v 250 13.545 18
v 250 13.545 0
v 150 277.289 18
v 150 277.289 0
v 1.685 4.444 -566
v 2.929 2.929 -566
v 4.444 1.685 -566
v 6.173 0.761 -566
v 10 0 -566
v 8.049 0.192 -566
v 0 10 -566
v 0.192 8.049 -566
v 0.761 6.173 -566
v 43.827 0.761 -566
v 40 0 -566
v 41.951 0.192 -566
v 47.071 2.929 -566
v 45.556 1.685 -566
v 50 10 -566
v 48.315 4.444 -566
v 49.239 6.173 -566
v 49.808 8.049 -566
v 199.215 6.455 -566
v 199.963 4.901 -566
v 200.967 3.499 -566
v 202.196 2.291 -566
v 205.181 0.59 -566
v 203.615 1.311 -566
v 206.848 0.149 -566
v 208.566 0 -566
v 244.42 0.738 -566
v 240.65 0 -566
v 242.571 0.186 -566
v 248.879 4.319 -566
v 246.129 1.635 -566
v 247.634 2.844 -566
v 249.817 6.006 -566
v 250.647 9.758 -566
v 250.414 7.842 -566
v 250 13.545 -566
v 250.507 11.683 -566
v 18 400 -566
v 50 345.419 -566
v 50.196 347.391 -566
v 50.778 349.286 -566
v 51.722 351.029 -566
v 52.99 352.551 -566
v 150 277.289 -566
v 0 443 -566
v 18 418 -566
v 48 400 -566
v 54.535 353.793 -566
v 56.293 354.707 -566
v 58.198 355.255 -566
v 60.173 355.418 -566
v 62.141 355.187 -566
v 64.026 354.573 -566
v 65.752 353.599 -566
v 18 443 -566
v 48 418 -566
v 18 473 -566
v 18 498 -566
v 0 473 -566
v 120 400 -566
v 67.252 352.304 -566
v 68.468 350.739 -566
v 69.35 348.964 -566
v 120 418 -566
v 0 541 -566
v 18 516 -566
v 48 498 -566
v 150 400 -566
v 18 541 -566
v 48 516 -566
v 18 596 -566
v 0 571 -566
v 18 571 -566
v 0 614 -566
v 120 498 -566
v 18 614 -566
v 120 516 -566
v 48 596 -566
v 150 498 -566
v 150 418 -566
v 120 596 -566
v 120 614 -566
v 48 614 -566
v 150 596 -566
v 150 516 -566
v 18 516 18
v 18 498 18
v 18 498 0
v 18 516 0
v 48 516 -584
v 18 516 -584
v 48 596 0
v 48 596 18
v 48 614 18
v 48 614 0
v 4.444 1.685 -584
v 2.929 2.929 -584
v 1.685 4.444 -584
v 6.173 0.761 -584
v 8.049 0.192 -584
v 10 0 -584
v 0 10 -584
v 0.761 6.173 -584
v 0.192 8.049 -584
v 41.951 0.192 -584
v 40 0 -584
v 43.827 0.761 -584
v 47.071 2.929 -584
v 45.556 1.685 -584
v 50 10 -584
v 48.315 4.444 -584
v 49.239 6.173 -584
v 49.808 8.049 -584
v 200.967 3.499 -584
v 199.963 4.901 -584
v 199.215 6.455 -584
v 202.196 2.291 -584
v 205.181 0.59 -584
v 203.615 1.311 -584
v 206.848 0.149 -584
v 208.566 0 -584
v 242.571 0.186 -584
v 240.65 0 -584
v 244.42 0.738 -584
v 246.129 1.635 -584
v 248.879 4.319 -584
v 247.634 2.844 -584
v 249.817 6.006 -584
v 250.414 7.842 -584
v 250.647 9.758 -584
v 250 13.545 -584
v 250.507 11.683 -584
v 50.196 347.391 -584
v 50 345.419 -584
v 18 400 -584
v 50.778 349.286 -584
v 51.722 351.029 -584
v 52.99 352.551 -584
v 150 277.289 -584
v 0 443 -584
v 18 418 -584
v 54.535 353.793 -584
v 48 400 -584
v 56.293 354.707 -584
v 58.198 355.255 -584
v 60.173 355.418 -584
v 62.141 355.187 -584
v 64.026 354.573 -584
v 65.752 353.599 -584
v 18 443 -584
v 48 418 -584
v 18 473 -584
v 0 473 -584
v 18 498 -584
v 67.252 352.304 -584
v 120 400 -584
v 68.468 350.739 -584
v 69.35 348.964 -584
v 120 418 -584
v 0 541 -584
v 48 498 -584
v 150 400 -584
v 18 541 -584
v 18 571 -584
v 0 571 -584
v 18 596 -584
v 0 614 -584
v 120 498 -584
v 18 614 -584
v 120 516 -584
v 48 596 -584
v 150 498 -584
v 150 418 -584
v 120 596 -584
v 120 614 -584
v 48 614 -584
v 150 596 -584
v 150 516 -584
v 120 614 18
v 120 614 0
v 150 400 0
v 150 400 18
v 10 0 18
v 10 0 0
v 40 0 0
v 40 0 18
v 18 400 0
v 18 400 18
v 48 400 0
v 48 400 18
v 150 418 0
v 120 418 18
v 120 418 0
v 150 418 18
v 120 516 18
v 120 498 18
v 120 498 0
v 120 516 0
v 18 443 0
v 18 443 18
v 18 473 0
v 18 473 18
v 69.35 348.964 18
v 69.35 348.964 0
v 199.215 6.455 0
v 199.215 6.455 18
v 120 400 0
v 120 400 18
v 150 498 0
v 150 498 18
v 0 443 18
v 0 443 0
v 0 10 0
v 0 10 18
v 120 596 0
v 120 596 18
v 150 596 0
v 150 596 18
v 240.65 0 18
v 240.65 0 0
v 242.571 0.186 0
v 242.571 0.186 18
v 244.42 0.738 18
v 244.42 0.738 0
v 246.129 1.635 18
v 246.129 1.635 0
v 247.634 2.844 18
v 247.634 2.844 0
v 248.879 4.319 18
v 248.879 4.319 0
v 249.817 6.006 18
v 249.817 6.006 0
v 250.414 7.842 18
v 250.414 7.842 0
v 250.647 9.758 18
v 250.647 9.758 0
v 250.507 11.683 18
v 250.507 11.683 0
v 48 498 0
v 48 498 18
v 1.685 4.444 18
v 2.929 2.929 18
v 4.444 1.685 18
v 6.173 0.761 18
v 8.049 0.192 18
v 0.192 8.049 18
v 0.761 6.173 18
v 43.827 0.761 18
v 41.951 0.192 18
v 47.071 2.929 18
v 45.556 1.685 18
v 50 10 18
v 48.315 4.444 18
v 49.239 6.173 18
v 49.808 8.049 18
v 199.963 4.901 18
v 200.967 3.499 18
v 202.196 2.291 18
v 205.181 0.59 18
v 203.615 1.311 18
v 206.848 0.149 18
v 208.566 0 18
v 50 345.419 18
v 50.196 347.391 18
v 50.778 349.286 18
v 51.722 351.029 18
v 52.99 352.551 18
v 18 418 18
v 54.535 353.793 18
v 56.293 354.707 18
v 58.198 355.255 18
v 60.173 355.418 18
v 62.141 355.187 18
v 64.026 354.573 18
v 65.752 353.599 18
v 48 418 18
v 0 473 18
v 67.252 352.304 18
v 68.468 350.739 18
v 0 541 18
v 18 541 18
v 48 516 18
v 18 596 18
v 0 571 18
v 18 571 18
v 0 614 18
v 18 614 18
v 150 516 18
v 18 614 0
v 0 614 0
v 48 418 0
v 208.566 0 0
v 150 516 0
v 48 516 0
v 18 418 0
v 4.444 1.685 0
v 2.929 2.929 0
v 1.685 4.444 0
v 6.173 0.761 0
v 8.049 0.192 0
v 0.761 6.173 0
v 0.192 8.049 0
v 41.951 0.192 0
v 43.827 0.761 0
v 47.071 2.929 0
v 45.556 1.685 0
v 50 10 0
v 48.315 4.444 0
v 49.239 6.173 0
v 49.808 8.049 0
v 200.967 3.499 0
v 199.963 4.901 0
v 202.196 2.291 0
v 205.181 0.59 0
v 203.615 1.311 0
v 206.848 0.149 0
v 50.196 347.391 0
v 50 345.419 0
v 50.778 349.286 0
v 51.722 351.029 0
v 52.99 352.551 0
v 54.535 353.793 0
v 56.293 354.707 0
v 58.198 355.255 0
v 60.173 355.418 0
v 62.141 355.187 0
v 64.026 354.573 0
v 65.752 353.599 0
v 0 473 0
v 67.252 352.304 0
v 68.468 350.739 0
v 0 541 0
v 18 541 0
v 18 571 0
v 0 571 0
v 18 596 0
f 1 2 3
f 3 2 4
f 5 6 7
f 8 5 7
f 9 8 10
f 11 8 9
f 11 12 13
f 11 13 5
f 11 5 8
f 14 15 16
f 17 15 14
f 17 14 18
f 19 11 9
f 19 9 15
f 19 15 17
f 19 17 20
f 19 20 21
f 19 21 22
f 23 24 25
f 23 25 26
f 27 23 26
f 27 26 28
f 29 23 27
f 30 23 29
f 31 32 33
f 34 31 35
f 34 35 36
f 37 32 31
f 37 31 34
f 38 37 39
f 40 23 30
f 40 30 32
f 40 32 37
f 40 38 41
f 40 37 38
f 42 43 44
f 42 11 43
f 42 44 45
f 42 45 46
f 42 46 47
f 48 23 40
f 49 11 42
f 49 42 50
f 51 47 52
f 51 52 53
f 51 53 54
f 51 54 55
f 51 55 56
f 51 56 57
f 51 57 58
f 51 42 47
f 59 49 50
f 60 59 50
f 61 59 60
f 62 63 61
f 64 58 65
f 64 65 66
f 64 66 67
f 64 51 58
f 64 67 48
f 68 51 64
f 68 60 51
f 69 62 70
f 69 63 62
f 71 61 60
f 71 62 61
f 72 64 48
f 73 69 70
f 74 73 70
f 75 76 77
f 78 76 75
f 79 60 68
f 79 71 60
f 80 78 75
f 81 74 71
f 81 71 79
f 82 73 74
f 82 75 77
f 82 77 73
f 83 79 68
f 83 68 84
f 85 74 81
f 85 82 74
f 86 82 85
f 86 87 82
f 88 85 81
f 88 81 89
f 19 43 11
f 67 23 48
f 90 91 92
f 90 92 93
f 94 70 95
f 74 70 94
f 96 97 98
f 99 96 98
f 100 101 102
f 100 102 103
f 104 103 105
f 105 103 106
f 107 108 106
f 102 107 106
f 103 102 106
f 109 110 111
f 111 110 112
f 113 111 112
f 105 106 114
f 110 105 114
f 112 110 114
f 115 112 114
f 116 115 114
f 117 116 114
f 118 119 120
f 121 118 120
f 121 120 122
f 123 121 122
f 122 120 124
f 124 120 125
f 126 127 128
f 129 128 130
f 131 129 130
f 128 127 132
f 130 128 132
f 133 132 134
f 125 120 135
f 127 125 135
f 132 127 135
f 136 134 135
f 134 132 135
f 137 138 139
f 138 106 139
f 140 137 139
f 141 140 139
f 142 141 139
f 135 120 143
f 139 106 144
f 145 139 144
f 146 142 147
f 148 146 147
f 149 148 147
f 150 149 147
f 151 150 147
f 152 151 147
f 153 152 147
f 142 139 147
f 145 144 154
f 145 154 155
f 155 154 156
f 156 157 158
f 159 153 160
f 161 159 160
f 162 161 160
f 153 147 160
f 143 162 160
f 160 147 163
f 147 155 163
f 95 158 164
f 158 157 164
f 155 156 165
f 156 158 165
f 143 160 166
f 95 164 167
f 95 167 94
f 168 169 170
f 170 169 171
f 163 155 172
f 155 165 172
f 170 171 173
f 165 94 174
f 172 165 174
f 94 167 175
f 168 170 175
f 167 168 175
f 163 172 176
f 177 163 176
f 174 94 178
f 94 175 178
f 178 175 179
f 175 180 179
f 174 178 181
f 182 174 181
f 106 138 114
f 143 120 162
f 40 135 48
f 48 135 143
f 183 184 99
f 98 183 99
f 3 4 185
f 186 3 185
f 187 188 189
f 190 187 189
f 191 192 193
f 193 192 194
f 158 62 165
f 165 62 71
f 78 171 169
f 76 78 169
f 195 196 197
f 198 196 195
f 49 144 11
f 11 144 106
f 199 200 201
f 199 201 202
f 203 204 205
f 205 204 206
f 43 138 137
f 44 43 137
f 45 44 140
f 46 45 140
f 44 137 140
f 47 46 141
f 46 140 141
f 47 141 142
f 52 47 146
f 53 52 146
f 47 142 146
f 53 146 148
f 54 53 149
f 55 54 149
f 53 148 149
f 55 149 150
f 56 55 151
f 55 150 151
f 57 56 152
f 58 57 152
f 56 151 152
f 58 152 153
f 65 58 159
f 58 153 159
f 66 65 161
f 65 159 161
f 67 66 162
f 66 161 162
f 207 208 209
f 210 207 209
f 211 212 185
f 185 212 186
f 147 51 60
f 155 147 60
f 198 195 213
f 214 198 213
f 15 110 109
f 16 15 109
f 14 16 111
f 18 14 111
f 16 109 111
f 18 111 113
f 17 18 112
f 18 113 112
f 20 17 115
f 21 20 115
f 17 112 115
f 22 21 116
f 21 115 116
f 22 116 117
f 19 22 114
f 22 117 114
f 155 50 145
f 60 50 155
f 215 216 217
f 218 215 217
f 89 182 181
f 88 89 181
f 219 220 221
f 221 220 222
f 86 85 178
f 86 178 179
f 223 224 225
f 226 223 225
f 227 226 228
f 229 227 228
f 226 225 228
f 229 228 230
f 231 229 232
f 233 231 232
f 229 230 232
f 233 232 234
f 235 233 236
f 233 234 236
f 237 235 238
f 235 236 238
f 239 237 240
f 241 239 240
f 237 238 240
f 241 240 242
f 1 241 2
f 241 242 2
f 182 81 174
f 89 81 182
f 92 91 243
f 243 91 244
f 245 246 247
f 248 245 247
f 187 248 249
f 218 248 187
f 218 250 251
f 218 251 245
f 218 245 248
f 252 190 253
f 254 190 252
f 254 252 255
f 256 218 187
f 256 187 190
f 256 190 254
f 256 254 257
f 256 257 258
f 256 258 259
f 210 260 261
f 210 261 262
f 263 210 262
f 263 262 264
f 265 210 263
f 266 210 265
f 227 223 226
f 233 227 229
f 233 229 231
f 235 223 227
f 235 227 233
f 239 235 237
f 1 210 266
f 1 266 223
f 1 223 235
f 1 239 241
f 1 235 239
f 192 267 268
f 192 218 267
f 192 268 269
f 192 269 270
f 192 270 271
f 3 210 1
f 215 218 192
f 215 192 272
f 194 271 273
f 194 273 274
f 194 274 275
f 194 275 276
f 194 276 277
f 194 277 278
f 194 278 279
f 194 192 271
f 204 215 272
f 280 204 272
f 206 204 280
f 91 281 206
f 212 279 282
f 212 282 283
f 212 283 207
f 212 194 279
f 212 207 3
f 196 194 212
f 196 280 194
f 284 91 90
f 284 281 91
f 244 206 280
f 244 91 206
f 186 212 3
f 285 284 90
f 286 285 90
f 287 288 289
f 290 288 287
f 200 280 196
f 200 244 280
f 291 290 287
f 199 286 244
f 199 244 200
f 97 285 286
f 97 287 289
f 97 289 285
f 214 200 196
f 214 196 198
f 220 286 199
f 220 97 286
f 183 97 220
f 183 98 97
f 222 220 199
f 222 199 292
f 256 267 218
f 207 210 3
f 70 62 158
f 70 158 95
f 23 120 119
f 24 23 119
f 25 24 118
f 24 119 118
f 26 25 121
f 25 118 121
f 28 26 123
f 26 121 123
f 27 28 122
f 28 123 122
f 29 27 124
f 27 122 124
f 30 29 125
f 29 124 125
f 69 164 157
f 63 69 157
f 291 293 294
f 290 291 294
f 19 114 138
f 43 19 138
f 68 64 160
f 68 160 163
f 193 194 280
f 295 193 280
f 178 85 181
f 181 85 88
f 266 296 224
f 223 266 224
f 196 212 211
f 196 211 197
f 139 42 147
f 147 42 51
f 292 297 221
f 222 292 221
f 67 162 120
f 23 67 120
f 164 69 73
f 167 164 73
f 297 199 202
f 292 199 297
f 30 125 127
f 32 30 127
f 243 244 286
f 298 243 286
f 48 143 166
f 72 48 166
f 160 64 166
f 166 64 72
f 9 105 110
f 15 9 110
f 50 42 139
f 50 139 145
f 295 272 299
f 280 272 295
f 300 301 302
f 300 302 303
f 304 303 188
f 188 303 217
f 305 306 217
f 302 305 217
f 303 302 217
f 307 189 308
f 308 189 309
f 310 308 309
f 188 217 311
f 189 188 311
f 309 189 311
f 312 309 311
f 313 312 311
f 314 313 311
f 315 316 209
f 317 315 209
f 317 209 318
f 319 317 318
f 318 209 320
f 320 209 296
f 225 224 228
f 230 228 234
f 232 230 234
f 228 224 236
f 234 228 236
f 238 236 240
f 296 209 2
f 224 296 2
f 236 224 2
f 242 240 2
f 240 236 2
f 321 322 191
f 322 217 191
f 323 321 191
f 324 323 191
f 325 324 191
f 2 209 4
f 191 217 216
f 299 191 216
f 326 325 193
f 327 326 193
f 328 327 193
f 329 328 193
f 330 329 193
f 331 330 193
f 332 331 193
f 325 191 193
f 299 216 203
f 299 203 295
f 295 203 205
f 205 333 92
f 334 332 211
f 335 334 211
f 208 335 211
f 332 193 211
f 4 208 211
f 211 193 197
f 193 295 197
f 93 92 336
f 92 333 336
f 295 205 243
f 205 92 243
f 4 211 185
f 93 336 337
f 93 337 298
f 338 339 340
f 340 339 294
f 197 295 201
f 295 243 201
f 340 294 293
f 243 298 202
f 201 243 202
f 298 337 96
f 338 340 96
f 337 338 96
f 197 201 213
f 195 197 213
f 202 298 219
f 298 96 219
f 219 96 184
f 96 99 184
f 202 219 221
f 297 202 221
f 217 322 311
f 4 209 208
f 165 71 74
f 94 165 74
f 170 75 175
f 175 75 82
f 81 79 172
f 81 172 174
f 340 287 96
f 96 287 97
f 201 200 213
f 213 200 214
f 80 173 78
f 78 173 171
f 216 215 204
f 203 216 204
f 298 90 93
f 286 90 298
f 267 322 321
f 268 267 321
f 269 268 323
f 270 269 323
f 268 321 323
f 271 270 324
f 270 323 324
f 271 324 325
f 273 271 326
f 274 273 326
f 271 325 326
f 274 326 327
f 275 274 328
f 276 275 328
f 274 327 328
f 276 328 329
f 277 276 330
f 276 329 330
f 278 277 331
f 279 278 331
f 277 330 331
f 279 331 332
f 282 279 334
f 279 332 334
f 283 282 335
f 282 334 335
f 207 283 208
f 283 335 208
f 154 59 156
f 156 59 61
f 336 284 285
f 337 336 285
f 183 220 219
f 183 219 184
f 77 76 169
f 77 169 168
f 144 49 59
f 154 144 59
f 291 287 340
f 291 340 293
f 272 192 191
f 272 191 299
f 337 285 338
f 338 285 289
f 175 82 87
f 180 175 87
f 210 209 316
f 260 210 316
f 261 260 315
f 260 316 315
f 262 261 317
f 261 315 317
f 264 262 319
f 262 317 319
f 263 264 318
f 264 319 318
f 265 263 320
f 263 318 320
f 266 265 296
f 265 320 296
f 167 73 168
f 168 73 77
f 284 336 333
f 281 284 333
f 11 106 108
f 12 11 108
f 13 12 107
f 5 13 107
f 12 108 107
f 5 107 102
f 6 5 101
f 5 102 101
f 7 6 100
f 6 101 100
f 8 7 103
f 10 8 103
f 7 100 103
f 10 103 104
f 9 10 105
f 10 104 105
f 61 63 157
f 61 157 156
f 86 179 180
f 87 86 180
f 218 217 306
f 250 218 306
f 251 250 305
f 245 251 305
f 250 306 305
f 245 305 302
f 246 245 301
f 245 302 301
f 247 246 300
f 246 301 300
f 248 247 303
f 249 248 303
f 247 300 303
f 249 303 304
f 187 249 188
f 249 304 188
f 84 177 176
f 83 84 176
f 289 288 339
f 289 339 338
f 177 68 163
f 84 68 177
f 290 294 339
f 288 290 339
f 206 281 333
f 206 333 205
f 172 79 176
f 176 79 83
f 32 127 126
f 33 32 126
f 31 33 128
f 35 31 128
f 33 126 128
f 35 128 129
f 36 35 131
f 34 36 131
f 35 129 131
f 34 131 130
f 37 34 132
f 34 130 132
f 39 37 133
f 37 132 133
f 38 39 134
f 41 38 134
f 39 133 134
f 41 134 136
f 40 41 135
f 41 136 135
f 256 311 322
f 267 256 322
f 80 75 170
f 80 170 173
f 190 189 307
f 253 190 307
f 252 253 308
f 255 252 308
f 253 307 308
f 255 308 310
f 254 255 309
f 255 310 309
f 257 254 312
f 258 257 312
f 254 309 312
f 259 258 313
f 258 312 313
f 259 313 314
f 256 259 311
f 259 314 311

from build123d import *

# Parameters (mm, degrees)
BOSS_EXTRU_1_DEPTH         = 18
R_P_TITION_LIN_AIRE1_COUNT = 2
R_P_TITION_LIN_AIRE1_PITCH = 584
ESQUISSE2_W                = 18
ESQUISSE2_H                = 30
ESQUISSE2_W_2              = 30
ESQUISSE2_H_2              = 18
ENL_V_MAT_EXTRU_1_DEPTH    = 896.670249126


with BuildPart() as part:
    # Esquisse1 → Boss.-Extru.1 (new body)
    with BuildSketch(Plane.XY):
        with BuildLine():
            Line((10, 0), (40, 0))
            ThreePointArc((40, 0), (47.071067812, 2.928932188), (50, 10))
            Line((50, 10), (50, 345.419131188))
            ThreePointArc((50, 345.419131188), (58.19785334, 355.255404233), (69.350453483, 348.964412512))
            Line((69.350453483, 348.964412512), (199.215087638, 6.454718676))
            ThreePointArc((199.215087638, 6.454718676), (202.884555874, 1.770394504), (208.565541121, 0))
            Line((208.565541121, 0), (240.649546517, 0))
            ThreePointArc((240.649546517, 0), (248.879152013, 4.319014753), (250, 13.545281324))
            Line((250, 13.545281324), (150, 277.288906417))
            Line((150, 277.288906417), (150, 614))
            Line((150, 614), (0, 614))
            Line((0, 614), (0, 10))
            ThreePointArc((0, 10), (2.928932188, 2.928932188), (10, 0))
        make_face()
    extrude(amount=BOSS_EXTRU_1_DEPTH)


with BuildPart() as r_p_tition_lin_aire1_1:
    # Répétition linéaire1: pattern copy
    add(part.part.moved(Location(Vector(0, 0, -1) * (1 * R_P_TITION_LIN_AIRE1_PITCH))))


with BuildPart() as enl_v_mat_extru_1_tool:
    # Esquisse2 → Enlèv. mat.-Extru.1 (new, through all)
    with BuildSketch(Plane.XY.offset(18)):
        with Locations((9, 556)):
            Rectangle(ESQUISSE2_W, ESQUISSE2_H)
        with Locations((9, 458)):
            Rectangle(ESQUISSE2_W, ESQUISSE2_H)
        with Locations((33, 605)):
            Rectangle(ESQUISSE2_W_2, ESQUISSE2_H_2)
        with Locations((135, 605)):
            Rectangle(ESQUISSE2_W_2, ESQUISSE2_H_2)
        with Locations((33, 507)):
            Rectangle(ESQUISSE2_W_2, ESQUISSE2_H_2)
        with Locations((135, 507)):
            Rectangle(ESQUISSE2_W_2, ESQUISSE2_H_2)
        with Locations((135, 409)):
            Rectangle(ESQUISSE2_W_2, ESQUISSE2_H_2)
        with Locations((33, 409)):
            Rectangle(ESQUISSE2_W_2, ESQUISSE2_H_2)
    extrude(amount=-ENL_V_MAT_EXTRU_1_DEPTH)


with BuildPart() as part_1:
    add(part.part)

    # Enlèv. mat.-Extru.1: cut by enl_v_mat_extru_1_tool
    add(enl_v_mat_extru_1_tool.part, mode=Mode.SUBTRACT)


with BuildPart() as r_p_tition_lin_aire1_1_1:
    add(r_p_tition_lin_aire1_1.part)

    # Enlèv. mat.-Extru.1: cut by enl_v_mat_extru_1_tool
    add(enl_v_mat_extru_1_tool.part, mode=Mode.SUBTRACT)


solid = Compound([part_1.part, r_p_tition_lin_aire1_1_1.part])
